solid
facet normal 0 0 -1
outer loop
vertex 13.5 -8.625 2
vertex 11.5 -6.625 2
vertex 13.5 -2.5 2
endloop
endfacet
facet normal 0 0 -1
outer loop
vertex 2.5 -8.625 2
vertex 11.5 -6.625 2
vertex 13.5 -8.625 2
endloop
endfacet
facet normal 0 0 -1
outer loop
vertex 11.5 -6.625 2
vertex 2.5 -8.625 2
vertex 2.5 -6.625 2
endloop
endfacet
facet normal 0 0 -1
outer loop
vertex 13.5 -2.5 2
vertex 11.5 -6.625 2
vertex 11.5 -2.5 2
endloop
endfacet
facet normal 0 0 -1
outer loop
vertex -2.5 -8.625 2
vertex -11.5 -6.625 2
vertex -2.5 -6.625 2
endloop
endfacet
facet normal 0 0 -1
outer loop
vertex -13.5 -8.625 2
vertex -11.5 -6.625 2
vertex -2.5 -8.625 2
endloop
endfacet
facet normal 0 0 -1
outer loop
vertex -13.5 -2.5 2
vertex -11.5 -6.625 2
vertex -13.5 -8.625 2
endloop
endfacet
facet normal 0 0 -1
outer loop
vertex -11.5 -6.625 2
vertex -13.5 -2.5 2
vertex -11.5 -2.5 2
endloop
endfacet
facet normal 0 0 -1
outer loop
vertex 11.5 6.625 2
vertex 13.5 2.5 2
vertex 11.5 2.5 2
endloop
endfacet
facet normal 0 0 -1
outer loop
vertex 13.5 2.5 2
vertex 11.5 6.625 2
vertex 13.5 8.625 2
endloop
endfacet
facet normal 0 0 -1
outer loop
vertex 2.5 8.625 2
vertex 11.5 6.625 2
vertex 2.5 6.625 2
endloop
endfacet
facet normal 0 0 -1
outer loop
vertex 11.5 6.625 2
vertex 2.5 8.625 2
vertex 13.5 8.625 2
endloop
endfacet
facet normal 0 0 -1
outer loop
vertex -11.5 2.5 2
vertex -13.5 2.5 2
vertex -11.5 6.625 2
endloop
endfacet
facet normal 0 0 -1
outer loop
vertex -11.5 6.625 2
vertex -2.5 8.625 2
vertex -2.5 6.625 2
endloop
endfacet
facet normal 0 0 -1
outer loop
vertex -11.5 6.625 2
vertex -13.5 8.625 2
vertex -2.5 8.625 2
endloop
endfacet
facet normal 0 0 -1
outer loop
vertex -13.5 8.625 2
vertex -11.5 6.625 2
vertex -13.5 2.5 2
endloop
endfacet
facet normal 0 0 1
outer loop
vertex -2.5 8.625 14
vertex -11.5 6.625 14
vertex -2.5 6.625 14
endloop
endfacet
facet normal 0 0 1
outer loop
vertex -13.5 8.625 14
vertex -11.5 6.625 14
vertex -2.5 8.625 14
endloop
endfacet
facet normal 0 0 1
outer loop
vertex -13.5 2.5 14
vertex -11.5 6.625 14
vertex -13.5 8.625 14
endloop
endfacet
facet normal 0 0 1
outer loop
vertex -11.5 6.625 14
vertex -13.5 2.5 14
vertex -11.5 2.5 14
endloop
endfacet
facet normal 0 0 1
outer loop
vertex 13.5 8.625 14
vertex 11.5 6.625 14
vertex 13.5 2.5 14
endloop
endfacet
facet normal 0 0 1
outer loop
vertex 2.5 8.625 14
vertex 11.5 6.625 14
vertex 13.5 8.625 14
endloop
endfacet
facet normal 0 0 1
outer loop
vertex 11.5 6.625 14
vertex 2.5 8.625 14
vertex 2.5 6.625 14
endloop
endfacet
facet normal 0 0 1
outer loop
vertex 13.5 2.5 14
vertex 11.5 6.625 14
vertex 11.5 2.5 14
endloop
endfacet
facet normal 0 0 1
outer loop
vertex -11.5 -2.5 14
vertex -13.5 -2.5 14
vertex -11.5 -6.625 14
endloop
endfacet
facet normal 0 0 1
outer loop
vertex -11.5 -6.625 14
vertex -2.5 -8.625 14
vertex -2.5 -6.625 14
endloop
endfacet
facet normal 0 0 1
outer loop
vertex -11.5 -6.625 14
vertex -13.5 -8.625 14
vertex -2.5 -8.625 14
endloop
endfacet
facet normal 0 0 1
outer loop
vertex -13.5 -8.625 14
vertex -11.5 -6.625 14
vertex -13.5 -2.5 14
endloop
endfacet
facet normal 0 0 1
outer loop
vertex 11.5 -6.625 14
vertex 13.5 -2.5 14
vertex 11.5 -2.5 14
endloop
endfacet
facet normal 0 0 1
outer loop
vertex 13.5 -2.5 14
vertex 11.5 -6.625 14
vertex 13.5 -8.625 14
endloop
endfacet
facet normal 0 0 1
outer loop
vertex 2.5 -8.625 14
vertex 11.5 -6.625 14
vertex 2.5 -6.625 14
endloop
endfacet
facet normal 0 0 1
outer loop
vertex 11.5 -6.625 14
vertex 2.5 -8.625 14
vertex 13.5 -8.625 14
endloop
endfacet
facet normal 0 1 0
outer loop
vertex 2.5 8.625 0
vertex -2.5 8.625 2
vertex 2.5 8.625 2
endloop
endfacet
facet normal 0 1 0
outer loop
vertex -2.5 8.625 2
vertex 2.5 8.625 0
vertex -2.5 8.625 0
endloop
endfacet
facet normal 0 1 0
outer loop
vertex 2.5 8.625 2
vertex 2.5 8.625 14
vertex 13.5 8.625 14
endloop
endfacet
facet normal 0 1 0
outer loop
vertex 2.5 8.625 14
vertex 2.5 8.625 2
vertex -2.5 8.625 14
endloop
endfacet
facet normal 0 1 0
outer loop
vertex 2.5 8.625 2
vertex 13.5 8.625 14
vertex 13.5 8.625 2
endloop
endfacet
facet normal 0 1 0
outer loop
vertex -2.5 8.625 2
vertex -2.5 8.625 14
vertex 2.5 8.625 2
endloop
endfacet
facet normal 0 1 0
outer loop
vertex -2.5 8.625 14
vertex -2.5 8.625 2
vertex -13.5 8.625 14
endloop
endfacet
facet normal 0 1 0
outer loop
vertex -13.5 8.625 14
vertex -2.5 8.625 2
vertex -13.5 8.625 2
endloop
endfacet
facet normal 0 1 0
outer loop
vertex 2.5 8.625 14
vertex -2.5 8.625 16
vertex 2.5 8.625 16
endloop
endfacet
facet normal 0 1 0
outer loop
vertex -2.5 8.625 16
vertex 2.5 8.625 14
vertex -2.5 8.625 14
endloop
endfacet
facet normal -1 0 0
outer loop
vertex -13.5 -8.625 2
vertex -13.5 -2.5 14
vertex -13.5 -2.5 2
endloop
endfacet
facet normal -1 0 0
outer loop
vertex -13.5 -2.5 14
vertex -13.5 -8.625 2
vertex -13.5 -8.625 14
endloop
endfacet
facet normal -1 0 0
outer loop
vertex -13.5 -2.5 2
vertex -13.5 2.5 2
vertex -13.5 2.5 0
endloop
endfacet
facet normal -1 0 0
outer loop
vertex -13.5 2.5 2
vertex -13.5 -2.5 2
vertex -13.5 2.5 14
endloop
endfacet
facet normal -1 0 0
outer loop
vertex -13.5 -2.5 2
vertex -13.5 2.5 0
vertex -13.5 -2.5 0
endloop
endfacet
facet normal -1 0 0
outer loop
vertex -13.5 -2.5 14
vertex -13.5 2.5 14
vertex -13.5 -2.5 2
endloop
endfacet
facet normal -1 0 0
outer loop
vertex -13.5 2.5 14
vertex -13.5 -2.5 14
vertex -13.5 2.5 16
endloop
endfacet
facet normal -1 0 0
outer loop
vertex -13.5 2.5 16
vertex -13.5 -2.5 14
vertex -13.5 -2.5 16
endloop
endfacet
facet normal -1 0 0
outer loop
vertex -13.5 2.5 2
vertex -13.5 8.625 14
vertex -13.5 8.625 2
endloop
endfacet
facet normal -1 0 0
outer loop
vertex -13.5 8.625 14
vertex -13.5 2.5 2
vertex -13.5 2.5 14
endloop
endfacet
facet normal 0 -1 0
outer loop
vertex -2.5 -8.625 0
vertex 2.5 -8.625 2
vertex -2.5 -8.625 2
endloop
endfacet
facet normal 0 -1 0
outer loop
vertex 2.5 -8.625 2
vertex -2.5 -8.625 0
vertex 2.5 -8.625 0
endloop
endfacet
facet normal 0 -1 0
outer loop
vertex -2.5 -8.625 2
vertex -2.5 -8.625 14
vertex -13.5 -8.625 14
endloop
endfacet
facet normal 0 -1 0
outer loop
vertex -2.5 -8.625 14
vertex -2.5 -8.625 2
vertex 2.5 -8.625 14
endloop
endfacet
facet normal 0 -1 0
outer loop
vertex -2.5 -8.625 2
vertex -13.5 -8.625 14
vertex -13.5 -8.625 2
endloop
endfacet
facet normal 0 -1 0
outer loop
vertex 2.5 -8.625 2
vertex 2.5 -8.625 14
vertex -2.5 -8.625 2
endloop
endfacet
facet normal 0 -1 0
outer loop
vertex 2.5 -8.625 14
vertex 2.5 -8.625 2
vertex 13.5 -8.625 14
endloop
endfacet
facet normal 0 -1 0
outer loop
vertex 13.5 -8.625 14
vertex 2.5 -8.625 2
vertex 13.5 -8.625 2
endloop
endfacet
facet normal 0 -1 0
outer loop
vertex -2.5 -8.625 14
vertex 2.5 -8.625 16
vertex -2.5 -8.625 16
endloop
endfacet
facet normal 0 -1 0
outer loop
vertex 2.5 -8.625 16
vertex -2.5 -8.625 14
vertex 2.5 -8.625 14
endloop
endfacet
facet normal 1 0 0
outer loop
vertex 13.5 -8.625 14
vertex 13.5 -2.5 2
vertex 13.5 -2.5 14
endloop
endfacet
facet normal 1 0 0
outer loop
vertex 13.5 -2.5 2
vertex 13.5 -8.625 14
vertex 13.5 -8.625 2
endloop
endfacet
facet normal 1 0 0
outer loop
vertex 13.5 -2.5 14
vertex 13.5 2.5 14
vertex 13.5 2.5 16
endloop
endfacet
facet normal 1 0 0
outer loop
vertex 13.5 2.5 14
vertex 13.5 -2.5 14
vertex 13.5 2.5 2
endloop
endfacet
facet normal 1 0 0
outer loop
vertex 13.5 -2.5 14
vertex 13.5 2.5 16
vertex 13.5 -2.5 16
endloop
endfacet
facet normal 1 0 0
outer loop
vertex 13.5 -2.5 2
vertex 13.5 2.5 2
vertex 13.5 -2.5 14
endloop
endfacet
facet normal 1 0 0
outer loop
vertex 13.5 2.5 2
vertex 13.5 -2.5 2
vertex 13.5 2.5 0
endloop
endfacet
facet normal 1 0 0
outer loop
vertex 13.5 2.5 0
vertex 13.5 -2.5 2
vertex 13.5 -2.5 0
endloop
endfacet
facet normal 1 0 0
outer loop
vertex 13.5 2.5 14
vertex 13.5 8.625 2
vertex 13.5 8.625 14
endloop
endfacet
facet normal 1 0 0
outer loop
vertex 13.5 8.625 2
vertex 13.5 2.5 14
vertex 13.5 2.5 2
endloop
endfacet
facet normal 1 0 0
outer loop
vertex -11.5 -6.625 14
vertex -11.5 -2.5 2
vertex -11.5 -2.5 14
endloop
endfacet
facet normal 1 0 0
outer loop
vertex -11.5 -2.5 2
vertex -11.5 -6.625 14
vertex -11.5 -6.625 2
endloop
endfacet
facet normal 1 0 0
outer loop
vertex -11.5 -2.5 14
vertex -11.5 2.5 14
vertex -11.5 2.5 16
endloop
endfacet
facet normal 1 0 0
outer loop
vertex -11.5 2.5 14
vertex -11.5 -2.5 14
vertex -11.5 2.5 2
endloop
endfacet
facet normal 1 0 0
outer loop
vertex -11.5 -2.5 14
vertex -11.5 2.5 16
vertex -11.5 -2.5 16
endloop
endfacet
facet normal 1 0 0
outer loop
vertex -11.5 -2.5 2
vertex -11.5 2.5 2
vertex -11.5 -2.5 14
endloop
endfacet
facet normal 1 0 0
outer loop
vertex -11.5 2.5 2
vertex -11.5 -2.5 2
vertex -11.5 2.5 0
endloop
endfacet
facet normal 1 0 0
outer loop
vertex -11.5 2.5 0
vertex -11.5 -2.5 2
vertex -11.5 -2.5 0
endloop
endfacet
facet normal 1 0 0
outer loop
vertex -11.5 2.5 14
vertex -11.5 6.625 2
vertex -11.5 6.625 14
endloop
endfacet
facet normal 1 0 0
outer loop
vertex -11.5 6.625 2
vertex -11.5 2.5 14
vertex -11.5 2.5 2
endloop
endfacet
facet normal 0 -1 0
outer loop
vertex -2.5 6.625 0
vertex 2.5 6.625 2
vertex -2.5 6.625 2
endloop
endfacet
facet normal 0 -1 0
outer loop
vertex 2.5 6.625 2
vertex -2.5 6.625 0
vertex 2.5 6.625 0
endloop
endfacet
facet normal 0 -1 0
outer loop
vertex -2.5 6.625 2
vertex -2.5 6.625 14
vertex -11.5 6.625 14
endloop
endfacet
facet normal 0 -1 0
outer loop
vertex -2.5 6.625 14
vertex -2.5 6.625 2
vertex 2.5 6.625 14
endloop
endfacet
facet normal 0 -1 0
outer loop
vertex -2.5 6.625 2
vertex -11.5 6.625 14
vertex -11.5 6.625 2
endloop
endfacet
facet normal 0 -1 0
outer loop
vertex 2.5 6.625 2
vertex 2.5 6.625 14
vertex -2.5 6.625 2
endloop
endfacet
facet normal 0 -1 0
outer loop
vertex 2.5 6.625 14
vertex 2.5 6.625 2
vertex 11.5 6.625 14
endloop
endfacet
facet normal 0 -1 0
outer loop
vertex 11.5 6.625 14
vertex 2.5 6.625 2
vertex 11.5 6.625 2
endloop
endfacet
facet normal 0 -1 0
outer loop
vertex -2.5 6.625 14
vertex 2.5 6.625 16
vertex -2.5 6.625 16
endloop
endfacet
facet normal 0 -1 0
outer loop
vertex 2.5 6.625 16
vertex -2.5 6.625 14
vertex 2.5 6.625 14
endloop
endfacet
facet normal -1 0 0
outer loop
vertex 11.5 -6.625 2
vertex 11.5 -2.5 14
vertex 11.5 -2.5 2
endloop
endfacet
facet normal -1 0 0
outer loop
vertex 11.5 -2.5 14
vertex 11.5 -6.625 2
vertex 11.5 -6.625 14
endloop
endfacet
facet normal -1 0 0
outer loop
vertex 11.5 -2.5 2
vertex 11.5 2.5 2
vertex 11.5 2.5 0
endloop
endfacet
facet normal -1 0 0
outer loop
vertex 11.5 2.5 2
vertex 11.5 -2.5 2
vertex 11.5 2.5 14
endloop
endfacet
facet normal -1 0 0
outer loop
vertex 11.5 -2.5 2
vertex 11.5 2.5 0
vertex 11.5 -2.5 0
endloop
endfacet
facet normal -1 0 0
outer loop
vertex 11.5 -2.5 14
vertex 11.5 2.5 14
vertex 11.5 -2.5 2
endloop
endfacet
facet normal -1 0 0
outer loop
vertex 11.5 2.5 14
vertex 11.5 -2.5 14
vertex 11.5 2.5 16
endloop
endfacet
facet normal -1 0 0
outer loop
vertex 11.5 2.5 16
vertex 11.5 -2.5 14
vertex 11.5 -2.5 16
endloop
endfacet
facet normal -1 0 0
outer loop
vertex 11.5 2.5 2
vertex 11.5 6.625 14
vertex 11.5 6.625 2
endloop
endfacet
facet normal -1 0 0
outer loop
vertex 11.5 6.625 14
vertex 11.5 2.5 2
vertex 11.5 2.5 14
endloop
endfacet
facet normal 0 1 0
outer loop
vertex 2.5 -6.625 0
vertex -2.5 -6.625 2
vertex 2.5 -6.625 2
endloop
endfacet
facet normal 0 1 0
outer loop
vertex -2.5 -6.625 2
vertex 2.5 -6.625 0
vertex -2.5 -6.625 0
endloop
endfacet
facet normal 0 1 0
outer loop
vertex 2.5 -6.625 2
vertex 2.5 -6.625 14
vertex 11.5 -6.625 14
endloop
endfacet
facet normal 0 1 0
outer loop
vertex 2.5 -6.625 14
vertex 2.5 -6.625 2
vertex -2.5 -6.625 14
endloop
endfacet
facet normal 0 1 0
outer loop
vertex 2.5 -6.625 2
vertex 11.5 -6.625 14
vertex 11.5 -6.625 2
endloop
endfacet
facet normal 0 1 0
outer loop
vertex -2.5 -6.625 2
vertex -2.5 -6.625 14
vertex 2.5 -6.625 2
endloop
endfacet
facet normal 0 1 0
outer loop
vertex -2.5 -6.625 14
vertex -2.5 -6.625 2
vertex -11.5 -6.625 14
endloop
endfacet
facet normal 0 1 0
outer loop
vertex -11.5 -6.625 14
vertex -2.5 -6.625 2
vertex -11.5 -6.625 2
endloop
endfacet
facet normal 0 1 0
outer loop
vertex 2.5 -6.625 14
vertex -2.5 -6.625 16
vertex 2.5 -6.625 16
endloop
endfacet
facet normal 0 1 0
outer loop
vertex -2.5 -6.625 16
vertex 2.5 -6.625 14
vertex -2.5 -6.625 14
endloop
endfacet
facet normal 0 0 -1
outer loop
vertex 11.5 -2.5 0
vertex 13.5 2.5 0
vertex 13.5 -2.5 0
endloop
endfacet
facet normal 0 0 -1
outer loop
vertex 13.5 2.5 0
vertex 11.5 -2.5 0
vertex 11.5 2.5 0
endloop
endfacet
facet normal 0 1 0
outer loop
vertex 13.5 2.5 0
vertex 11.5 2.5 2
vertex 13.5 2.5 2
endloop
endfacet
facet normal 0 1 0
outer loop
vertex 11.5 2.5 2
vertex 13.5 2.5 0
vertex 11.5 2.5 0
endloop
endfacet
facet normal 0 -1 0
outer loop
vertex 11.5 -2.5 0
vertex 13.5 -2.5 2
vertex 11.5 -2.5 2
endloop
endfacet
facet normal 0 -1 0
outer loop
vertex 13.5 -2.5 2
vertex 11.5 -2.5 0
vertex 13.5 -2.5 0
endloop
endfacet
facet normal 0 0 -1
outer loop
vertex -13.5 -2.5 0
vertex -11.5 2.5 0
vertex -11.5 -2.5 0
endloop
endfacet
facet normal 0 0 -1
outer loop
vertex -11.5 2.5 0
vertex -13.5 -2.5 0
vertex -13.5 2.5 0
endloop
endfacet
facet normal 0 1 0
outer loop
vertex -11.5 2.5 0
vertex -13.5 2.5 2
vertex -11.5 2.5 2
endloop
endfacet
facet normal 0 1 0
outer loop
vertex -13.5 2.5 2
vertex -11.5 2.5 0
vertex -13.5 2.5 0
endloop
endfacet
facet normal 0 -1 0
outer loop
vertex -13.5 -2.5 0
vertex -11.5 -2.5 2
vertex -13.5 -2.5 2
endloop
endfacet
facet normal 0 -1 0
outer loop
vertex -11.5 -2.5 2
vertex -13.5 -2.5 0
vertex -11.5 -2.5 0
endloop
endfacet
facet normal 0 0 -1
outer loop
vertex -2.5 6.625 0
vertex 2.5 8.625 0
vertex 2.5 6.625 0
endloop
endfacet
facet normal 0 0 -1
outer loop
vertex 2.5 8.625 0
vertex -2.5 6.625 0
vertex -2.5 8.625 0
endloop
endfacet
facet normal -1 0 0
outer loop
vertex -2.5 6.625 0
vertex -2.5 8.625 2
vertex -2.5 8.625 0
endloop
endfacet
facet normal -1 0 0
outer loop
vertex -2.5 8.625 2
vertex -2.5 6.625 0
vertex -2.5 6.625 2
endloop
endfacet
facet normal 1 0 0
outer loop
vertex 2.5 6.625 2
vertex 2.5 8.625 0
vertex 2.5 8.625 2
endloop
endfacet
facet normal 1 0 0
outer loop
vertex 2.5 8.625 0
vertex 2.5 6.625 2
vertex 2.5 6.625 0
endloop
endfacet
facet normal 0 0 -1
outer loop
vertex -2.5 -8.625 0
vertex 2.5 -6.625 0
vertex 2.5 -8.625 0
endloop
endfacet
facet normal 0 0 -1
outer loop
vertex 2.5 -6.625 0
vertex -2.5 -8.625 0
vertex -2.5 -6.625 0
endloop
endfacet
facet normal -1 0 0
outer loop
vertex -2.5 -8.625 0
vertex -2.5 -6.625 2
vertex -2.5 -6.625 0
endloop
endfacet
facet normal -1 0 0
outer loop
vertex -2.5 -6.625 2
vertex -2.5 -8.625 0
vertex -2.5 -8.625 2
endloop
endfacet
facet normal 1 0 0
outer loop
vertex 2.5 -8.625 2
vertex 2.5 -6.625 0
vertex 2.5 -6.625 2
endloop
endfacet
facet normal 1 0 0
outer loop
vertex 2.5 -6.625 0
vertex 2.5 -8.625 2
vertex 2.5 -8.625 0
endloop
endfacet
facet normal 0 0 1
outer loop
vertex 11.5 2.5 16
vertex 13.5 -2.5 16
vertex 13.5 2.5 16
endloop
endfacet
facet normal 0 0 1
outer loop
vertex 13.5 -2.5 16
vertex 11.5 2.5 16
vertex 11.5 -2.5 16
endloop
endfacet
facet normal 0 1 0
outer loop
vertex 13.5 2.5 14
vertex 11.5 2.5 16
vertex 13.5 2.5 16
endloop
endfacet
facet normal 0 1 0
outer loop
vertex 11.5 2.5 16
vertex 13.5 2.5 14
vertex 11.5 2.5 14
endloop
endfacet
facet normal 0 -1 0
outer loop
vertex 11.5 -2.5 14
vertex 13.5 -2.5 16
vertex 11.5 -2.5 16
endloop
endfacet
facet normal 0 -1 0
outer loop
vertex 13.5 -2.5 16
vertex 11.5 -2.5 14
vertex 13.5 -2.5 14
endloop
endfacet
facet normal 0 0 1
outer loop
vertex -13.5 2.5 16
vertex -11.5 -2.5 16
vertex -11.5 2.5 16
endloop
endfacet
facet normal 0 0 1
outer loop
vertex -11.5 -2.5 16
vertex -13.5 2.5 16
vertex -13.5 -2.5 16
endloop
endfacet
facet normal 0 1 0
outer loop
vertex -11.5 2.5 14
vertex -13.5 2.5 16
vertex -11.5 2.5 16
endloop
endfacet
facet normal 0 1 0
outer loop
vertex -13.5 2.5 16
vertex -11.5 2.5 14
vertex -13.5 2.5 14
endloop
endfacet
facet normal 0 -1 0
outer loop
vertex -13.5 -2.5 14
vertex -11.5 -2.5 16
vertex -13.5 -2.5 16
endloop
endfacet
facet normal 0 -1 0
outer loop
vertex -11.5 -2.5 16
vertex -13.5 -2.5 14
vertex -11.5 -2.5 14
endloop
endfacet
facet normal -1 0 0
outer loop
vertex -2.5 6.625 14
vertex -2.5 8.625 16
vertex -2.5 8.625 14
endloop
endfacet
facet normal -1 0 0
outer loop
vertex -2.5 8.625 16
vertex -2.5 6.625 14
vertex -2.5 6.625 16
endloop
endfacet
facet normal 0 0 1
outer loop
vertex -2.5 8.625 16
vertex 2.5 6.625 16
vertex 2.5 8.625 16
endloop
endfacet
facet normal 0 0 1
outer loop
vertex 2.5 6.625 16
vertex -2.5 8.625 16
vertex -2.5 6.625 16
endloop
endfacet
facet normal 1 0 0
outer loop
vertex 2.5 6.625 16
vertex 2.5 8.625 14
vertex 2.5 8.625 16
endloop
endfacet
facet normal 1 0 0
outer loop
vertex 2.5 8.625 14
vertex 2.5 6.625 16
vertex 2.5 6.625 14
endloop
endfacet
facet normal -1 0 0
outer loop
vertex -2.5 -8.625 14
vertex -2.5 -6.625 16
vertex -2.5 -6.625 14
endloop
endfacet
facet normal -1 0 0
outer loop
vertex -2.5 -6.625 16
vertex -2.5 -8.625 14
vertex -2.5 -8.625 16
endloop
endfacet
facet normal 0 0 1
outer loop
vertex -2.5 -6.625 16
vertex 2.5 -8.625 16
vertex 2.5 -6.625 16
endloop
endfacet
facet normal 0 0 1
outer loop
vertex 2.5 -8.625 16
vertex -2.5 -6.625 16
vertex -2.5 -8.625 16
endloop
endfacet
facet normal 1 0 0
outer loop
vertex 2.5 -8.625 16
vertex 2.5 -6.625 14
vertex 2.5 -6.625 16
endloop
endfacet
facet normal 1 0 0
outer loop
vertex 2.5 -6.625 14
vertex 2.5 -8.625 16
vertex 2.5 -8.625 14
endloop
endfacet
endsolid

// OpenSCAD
// file: 43VA-half-2mm.scad
radii = 2;

innerx = 23;    // CRIT 23 > 22mm. on EI 43VA.
outerx = 43;   // CRIT 43 < 44mm on EI 43VA.


wall = 2;
bodywall= wall + 0;    // for body. not flange. should not need to change

// eg. body height for two bobbins. but measured on length of EI plate
height = ((32) / 2) - (wall * 2 );   // CRIT 32 < 33mm. measured on EI. 


// EI plate stack height.
// can just add or remove plates to fit. change for half-stack
innery = 26.5 / 2;  // NOT CRIT. freecad was 26. should be 26.5 or 27
outery = innery + (10 * 2);   // NOT CRIT. (48-26.5)/2 = 10.75mm border
// main file
/*
    the way to handle generation of multiple stl files, with slightly varying parameters
    actually easier to import a values file for each instance.

*/

$fn = 20;


// Wall thickness>1.2mm, thinnest part≥0.8mm
// Would be nice to be able to add text.



// 43-1.2-full 

// overrides
// include <43VA-1.2mm.scad>
// include <43VA-2mm.scad>
// include <43VA-half-1.2mm.scad>
include <43VA-half-2mm.scad>










/*
    EXTR. tab must be set to wall thickness.
        and cannot protrude past the box perimeter
    - otherwise the wound coil cannot be slid off.
*/

tabx = wall;
taby = 5;

fudge = 0.3;  // not div
tabxf = tabx + fudge;
tabyf = taby + fudge;



// horizontal flange
// color("yellow")
% group() {

    // circular protrusion needed for jlcpcb
     linear_extrude(10) {
           // circ
         translate([0, -(innery /2 + 5), 0 ] )
           circle( 3/2);
    }

     linear_extrude( wall) {

        difference() {

            group() {
            offset(r = radii)
                square( [outerx - radii * 2, outery - radii * 2], center = true);


            }

            group() {
                square( [innerx , innery  ], center = true);

               // right
               translate( [ innerx / 2  + tabx / 2 ,0, 0 ] )
                square( [tabxf, tabyf ] , center = true);

               // left
               translate( [ -innerx / 2  - tabx / 2 ,0, 0 ] )
                square( [tabxf, tabyf ] , center = true);

               // top
               translate( [  0,  +innery / 2  + tabx / 2 , 0 ] )
                square( [ tabyf, tabxf  ] , center = true);

               // bottom
               translate( [  0,  -innery / 2  - tabx / 2 , 0 ] )
                square( [ tabyf, tabxf  ] , center = true);


                /*
               // have to mirror text if put on bottom
               // text engrave min. depth is 0.8mm. and 0.8mm  width.
               // so must be put on top, even if its the inside
               translate( [0, (innery / 2) + 3.5, 0])
                 //mirror([1,0,0])
                   // text("main06.scad", 2.5, halign = "center");
                text("dsn06", 5, halign = "center");

                 */
            }
        }
    }
}


//
// % transparent
// # easier to see
// box/ former


/*
 if use  half wall for tab depth, then the flange can have two bobbins at each end.
 but if tab - is <1.2mm it may not be manufacturable
 perhaps need to try making both
 wall / 2;  // only for positive shape
*/
tabz =  wall ; // / 2

// %color("lightblue")
translate([0,0, wall + 0 ] ) {

 // eg. we (16 / 2) -0.4 - 0.4
 linear_extrude(  height)
    difference() {

        square( [innerx + (bodywall * 2), innery + (bodywall * 2)], center = true);
        square( [innerx , innery  ], center = true);
  }


    // bottom tabs

    // right
    translate( [ innerx / 2  + tabx / 2 , 0, -tabz  ] )
    linear_extrude( tabz )
        square( [tabx, taby ] , center = true);

    // left
    translate( [ -innerx / 2  - tabx / 2 , 0, -tabz  ] )
    linear_extrude( tabz )
        square( [tabx, taby ] , center = true);

    // top
    translate( [ 0, innery / 2  + tabx / 2 , -tabz  ] )
    linear_extrude( tabz)
        square( [ taby, tabx  ] , center = true);

    // bottom
    translate( [ 0, -innery / 2  - tabx / 2 , -tabz  ] )
    linear_extrude( tabz)
        square( [taby, tabx  ] , center = true);

   // top tabs


    // right
    translate( [ innerx / 2  + tabx / 2 , 0, height   ] )
    linear_extrude( tabz )
        square( [tabx, taby ] , center = true);

    // left
    translate( [ -innerx / 2  - tabx / 2 , 0, height  ] )
    linear_extrude( tabz )
        square( [tabx, taby ] , center = true);

    // top
    translate( [ 0, innery / 2  + tabx / 2 ,  height ] )
    linear_extrude( tabz )
        square( [ taby, tabx  ] , center = true);

    // bottom
    translate( [ 0, -innery / 2  - tabx / 2 , height  ] )
    linear_extrude( tabz)
        square( [taby, tabx  ] , center = true);



}
